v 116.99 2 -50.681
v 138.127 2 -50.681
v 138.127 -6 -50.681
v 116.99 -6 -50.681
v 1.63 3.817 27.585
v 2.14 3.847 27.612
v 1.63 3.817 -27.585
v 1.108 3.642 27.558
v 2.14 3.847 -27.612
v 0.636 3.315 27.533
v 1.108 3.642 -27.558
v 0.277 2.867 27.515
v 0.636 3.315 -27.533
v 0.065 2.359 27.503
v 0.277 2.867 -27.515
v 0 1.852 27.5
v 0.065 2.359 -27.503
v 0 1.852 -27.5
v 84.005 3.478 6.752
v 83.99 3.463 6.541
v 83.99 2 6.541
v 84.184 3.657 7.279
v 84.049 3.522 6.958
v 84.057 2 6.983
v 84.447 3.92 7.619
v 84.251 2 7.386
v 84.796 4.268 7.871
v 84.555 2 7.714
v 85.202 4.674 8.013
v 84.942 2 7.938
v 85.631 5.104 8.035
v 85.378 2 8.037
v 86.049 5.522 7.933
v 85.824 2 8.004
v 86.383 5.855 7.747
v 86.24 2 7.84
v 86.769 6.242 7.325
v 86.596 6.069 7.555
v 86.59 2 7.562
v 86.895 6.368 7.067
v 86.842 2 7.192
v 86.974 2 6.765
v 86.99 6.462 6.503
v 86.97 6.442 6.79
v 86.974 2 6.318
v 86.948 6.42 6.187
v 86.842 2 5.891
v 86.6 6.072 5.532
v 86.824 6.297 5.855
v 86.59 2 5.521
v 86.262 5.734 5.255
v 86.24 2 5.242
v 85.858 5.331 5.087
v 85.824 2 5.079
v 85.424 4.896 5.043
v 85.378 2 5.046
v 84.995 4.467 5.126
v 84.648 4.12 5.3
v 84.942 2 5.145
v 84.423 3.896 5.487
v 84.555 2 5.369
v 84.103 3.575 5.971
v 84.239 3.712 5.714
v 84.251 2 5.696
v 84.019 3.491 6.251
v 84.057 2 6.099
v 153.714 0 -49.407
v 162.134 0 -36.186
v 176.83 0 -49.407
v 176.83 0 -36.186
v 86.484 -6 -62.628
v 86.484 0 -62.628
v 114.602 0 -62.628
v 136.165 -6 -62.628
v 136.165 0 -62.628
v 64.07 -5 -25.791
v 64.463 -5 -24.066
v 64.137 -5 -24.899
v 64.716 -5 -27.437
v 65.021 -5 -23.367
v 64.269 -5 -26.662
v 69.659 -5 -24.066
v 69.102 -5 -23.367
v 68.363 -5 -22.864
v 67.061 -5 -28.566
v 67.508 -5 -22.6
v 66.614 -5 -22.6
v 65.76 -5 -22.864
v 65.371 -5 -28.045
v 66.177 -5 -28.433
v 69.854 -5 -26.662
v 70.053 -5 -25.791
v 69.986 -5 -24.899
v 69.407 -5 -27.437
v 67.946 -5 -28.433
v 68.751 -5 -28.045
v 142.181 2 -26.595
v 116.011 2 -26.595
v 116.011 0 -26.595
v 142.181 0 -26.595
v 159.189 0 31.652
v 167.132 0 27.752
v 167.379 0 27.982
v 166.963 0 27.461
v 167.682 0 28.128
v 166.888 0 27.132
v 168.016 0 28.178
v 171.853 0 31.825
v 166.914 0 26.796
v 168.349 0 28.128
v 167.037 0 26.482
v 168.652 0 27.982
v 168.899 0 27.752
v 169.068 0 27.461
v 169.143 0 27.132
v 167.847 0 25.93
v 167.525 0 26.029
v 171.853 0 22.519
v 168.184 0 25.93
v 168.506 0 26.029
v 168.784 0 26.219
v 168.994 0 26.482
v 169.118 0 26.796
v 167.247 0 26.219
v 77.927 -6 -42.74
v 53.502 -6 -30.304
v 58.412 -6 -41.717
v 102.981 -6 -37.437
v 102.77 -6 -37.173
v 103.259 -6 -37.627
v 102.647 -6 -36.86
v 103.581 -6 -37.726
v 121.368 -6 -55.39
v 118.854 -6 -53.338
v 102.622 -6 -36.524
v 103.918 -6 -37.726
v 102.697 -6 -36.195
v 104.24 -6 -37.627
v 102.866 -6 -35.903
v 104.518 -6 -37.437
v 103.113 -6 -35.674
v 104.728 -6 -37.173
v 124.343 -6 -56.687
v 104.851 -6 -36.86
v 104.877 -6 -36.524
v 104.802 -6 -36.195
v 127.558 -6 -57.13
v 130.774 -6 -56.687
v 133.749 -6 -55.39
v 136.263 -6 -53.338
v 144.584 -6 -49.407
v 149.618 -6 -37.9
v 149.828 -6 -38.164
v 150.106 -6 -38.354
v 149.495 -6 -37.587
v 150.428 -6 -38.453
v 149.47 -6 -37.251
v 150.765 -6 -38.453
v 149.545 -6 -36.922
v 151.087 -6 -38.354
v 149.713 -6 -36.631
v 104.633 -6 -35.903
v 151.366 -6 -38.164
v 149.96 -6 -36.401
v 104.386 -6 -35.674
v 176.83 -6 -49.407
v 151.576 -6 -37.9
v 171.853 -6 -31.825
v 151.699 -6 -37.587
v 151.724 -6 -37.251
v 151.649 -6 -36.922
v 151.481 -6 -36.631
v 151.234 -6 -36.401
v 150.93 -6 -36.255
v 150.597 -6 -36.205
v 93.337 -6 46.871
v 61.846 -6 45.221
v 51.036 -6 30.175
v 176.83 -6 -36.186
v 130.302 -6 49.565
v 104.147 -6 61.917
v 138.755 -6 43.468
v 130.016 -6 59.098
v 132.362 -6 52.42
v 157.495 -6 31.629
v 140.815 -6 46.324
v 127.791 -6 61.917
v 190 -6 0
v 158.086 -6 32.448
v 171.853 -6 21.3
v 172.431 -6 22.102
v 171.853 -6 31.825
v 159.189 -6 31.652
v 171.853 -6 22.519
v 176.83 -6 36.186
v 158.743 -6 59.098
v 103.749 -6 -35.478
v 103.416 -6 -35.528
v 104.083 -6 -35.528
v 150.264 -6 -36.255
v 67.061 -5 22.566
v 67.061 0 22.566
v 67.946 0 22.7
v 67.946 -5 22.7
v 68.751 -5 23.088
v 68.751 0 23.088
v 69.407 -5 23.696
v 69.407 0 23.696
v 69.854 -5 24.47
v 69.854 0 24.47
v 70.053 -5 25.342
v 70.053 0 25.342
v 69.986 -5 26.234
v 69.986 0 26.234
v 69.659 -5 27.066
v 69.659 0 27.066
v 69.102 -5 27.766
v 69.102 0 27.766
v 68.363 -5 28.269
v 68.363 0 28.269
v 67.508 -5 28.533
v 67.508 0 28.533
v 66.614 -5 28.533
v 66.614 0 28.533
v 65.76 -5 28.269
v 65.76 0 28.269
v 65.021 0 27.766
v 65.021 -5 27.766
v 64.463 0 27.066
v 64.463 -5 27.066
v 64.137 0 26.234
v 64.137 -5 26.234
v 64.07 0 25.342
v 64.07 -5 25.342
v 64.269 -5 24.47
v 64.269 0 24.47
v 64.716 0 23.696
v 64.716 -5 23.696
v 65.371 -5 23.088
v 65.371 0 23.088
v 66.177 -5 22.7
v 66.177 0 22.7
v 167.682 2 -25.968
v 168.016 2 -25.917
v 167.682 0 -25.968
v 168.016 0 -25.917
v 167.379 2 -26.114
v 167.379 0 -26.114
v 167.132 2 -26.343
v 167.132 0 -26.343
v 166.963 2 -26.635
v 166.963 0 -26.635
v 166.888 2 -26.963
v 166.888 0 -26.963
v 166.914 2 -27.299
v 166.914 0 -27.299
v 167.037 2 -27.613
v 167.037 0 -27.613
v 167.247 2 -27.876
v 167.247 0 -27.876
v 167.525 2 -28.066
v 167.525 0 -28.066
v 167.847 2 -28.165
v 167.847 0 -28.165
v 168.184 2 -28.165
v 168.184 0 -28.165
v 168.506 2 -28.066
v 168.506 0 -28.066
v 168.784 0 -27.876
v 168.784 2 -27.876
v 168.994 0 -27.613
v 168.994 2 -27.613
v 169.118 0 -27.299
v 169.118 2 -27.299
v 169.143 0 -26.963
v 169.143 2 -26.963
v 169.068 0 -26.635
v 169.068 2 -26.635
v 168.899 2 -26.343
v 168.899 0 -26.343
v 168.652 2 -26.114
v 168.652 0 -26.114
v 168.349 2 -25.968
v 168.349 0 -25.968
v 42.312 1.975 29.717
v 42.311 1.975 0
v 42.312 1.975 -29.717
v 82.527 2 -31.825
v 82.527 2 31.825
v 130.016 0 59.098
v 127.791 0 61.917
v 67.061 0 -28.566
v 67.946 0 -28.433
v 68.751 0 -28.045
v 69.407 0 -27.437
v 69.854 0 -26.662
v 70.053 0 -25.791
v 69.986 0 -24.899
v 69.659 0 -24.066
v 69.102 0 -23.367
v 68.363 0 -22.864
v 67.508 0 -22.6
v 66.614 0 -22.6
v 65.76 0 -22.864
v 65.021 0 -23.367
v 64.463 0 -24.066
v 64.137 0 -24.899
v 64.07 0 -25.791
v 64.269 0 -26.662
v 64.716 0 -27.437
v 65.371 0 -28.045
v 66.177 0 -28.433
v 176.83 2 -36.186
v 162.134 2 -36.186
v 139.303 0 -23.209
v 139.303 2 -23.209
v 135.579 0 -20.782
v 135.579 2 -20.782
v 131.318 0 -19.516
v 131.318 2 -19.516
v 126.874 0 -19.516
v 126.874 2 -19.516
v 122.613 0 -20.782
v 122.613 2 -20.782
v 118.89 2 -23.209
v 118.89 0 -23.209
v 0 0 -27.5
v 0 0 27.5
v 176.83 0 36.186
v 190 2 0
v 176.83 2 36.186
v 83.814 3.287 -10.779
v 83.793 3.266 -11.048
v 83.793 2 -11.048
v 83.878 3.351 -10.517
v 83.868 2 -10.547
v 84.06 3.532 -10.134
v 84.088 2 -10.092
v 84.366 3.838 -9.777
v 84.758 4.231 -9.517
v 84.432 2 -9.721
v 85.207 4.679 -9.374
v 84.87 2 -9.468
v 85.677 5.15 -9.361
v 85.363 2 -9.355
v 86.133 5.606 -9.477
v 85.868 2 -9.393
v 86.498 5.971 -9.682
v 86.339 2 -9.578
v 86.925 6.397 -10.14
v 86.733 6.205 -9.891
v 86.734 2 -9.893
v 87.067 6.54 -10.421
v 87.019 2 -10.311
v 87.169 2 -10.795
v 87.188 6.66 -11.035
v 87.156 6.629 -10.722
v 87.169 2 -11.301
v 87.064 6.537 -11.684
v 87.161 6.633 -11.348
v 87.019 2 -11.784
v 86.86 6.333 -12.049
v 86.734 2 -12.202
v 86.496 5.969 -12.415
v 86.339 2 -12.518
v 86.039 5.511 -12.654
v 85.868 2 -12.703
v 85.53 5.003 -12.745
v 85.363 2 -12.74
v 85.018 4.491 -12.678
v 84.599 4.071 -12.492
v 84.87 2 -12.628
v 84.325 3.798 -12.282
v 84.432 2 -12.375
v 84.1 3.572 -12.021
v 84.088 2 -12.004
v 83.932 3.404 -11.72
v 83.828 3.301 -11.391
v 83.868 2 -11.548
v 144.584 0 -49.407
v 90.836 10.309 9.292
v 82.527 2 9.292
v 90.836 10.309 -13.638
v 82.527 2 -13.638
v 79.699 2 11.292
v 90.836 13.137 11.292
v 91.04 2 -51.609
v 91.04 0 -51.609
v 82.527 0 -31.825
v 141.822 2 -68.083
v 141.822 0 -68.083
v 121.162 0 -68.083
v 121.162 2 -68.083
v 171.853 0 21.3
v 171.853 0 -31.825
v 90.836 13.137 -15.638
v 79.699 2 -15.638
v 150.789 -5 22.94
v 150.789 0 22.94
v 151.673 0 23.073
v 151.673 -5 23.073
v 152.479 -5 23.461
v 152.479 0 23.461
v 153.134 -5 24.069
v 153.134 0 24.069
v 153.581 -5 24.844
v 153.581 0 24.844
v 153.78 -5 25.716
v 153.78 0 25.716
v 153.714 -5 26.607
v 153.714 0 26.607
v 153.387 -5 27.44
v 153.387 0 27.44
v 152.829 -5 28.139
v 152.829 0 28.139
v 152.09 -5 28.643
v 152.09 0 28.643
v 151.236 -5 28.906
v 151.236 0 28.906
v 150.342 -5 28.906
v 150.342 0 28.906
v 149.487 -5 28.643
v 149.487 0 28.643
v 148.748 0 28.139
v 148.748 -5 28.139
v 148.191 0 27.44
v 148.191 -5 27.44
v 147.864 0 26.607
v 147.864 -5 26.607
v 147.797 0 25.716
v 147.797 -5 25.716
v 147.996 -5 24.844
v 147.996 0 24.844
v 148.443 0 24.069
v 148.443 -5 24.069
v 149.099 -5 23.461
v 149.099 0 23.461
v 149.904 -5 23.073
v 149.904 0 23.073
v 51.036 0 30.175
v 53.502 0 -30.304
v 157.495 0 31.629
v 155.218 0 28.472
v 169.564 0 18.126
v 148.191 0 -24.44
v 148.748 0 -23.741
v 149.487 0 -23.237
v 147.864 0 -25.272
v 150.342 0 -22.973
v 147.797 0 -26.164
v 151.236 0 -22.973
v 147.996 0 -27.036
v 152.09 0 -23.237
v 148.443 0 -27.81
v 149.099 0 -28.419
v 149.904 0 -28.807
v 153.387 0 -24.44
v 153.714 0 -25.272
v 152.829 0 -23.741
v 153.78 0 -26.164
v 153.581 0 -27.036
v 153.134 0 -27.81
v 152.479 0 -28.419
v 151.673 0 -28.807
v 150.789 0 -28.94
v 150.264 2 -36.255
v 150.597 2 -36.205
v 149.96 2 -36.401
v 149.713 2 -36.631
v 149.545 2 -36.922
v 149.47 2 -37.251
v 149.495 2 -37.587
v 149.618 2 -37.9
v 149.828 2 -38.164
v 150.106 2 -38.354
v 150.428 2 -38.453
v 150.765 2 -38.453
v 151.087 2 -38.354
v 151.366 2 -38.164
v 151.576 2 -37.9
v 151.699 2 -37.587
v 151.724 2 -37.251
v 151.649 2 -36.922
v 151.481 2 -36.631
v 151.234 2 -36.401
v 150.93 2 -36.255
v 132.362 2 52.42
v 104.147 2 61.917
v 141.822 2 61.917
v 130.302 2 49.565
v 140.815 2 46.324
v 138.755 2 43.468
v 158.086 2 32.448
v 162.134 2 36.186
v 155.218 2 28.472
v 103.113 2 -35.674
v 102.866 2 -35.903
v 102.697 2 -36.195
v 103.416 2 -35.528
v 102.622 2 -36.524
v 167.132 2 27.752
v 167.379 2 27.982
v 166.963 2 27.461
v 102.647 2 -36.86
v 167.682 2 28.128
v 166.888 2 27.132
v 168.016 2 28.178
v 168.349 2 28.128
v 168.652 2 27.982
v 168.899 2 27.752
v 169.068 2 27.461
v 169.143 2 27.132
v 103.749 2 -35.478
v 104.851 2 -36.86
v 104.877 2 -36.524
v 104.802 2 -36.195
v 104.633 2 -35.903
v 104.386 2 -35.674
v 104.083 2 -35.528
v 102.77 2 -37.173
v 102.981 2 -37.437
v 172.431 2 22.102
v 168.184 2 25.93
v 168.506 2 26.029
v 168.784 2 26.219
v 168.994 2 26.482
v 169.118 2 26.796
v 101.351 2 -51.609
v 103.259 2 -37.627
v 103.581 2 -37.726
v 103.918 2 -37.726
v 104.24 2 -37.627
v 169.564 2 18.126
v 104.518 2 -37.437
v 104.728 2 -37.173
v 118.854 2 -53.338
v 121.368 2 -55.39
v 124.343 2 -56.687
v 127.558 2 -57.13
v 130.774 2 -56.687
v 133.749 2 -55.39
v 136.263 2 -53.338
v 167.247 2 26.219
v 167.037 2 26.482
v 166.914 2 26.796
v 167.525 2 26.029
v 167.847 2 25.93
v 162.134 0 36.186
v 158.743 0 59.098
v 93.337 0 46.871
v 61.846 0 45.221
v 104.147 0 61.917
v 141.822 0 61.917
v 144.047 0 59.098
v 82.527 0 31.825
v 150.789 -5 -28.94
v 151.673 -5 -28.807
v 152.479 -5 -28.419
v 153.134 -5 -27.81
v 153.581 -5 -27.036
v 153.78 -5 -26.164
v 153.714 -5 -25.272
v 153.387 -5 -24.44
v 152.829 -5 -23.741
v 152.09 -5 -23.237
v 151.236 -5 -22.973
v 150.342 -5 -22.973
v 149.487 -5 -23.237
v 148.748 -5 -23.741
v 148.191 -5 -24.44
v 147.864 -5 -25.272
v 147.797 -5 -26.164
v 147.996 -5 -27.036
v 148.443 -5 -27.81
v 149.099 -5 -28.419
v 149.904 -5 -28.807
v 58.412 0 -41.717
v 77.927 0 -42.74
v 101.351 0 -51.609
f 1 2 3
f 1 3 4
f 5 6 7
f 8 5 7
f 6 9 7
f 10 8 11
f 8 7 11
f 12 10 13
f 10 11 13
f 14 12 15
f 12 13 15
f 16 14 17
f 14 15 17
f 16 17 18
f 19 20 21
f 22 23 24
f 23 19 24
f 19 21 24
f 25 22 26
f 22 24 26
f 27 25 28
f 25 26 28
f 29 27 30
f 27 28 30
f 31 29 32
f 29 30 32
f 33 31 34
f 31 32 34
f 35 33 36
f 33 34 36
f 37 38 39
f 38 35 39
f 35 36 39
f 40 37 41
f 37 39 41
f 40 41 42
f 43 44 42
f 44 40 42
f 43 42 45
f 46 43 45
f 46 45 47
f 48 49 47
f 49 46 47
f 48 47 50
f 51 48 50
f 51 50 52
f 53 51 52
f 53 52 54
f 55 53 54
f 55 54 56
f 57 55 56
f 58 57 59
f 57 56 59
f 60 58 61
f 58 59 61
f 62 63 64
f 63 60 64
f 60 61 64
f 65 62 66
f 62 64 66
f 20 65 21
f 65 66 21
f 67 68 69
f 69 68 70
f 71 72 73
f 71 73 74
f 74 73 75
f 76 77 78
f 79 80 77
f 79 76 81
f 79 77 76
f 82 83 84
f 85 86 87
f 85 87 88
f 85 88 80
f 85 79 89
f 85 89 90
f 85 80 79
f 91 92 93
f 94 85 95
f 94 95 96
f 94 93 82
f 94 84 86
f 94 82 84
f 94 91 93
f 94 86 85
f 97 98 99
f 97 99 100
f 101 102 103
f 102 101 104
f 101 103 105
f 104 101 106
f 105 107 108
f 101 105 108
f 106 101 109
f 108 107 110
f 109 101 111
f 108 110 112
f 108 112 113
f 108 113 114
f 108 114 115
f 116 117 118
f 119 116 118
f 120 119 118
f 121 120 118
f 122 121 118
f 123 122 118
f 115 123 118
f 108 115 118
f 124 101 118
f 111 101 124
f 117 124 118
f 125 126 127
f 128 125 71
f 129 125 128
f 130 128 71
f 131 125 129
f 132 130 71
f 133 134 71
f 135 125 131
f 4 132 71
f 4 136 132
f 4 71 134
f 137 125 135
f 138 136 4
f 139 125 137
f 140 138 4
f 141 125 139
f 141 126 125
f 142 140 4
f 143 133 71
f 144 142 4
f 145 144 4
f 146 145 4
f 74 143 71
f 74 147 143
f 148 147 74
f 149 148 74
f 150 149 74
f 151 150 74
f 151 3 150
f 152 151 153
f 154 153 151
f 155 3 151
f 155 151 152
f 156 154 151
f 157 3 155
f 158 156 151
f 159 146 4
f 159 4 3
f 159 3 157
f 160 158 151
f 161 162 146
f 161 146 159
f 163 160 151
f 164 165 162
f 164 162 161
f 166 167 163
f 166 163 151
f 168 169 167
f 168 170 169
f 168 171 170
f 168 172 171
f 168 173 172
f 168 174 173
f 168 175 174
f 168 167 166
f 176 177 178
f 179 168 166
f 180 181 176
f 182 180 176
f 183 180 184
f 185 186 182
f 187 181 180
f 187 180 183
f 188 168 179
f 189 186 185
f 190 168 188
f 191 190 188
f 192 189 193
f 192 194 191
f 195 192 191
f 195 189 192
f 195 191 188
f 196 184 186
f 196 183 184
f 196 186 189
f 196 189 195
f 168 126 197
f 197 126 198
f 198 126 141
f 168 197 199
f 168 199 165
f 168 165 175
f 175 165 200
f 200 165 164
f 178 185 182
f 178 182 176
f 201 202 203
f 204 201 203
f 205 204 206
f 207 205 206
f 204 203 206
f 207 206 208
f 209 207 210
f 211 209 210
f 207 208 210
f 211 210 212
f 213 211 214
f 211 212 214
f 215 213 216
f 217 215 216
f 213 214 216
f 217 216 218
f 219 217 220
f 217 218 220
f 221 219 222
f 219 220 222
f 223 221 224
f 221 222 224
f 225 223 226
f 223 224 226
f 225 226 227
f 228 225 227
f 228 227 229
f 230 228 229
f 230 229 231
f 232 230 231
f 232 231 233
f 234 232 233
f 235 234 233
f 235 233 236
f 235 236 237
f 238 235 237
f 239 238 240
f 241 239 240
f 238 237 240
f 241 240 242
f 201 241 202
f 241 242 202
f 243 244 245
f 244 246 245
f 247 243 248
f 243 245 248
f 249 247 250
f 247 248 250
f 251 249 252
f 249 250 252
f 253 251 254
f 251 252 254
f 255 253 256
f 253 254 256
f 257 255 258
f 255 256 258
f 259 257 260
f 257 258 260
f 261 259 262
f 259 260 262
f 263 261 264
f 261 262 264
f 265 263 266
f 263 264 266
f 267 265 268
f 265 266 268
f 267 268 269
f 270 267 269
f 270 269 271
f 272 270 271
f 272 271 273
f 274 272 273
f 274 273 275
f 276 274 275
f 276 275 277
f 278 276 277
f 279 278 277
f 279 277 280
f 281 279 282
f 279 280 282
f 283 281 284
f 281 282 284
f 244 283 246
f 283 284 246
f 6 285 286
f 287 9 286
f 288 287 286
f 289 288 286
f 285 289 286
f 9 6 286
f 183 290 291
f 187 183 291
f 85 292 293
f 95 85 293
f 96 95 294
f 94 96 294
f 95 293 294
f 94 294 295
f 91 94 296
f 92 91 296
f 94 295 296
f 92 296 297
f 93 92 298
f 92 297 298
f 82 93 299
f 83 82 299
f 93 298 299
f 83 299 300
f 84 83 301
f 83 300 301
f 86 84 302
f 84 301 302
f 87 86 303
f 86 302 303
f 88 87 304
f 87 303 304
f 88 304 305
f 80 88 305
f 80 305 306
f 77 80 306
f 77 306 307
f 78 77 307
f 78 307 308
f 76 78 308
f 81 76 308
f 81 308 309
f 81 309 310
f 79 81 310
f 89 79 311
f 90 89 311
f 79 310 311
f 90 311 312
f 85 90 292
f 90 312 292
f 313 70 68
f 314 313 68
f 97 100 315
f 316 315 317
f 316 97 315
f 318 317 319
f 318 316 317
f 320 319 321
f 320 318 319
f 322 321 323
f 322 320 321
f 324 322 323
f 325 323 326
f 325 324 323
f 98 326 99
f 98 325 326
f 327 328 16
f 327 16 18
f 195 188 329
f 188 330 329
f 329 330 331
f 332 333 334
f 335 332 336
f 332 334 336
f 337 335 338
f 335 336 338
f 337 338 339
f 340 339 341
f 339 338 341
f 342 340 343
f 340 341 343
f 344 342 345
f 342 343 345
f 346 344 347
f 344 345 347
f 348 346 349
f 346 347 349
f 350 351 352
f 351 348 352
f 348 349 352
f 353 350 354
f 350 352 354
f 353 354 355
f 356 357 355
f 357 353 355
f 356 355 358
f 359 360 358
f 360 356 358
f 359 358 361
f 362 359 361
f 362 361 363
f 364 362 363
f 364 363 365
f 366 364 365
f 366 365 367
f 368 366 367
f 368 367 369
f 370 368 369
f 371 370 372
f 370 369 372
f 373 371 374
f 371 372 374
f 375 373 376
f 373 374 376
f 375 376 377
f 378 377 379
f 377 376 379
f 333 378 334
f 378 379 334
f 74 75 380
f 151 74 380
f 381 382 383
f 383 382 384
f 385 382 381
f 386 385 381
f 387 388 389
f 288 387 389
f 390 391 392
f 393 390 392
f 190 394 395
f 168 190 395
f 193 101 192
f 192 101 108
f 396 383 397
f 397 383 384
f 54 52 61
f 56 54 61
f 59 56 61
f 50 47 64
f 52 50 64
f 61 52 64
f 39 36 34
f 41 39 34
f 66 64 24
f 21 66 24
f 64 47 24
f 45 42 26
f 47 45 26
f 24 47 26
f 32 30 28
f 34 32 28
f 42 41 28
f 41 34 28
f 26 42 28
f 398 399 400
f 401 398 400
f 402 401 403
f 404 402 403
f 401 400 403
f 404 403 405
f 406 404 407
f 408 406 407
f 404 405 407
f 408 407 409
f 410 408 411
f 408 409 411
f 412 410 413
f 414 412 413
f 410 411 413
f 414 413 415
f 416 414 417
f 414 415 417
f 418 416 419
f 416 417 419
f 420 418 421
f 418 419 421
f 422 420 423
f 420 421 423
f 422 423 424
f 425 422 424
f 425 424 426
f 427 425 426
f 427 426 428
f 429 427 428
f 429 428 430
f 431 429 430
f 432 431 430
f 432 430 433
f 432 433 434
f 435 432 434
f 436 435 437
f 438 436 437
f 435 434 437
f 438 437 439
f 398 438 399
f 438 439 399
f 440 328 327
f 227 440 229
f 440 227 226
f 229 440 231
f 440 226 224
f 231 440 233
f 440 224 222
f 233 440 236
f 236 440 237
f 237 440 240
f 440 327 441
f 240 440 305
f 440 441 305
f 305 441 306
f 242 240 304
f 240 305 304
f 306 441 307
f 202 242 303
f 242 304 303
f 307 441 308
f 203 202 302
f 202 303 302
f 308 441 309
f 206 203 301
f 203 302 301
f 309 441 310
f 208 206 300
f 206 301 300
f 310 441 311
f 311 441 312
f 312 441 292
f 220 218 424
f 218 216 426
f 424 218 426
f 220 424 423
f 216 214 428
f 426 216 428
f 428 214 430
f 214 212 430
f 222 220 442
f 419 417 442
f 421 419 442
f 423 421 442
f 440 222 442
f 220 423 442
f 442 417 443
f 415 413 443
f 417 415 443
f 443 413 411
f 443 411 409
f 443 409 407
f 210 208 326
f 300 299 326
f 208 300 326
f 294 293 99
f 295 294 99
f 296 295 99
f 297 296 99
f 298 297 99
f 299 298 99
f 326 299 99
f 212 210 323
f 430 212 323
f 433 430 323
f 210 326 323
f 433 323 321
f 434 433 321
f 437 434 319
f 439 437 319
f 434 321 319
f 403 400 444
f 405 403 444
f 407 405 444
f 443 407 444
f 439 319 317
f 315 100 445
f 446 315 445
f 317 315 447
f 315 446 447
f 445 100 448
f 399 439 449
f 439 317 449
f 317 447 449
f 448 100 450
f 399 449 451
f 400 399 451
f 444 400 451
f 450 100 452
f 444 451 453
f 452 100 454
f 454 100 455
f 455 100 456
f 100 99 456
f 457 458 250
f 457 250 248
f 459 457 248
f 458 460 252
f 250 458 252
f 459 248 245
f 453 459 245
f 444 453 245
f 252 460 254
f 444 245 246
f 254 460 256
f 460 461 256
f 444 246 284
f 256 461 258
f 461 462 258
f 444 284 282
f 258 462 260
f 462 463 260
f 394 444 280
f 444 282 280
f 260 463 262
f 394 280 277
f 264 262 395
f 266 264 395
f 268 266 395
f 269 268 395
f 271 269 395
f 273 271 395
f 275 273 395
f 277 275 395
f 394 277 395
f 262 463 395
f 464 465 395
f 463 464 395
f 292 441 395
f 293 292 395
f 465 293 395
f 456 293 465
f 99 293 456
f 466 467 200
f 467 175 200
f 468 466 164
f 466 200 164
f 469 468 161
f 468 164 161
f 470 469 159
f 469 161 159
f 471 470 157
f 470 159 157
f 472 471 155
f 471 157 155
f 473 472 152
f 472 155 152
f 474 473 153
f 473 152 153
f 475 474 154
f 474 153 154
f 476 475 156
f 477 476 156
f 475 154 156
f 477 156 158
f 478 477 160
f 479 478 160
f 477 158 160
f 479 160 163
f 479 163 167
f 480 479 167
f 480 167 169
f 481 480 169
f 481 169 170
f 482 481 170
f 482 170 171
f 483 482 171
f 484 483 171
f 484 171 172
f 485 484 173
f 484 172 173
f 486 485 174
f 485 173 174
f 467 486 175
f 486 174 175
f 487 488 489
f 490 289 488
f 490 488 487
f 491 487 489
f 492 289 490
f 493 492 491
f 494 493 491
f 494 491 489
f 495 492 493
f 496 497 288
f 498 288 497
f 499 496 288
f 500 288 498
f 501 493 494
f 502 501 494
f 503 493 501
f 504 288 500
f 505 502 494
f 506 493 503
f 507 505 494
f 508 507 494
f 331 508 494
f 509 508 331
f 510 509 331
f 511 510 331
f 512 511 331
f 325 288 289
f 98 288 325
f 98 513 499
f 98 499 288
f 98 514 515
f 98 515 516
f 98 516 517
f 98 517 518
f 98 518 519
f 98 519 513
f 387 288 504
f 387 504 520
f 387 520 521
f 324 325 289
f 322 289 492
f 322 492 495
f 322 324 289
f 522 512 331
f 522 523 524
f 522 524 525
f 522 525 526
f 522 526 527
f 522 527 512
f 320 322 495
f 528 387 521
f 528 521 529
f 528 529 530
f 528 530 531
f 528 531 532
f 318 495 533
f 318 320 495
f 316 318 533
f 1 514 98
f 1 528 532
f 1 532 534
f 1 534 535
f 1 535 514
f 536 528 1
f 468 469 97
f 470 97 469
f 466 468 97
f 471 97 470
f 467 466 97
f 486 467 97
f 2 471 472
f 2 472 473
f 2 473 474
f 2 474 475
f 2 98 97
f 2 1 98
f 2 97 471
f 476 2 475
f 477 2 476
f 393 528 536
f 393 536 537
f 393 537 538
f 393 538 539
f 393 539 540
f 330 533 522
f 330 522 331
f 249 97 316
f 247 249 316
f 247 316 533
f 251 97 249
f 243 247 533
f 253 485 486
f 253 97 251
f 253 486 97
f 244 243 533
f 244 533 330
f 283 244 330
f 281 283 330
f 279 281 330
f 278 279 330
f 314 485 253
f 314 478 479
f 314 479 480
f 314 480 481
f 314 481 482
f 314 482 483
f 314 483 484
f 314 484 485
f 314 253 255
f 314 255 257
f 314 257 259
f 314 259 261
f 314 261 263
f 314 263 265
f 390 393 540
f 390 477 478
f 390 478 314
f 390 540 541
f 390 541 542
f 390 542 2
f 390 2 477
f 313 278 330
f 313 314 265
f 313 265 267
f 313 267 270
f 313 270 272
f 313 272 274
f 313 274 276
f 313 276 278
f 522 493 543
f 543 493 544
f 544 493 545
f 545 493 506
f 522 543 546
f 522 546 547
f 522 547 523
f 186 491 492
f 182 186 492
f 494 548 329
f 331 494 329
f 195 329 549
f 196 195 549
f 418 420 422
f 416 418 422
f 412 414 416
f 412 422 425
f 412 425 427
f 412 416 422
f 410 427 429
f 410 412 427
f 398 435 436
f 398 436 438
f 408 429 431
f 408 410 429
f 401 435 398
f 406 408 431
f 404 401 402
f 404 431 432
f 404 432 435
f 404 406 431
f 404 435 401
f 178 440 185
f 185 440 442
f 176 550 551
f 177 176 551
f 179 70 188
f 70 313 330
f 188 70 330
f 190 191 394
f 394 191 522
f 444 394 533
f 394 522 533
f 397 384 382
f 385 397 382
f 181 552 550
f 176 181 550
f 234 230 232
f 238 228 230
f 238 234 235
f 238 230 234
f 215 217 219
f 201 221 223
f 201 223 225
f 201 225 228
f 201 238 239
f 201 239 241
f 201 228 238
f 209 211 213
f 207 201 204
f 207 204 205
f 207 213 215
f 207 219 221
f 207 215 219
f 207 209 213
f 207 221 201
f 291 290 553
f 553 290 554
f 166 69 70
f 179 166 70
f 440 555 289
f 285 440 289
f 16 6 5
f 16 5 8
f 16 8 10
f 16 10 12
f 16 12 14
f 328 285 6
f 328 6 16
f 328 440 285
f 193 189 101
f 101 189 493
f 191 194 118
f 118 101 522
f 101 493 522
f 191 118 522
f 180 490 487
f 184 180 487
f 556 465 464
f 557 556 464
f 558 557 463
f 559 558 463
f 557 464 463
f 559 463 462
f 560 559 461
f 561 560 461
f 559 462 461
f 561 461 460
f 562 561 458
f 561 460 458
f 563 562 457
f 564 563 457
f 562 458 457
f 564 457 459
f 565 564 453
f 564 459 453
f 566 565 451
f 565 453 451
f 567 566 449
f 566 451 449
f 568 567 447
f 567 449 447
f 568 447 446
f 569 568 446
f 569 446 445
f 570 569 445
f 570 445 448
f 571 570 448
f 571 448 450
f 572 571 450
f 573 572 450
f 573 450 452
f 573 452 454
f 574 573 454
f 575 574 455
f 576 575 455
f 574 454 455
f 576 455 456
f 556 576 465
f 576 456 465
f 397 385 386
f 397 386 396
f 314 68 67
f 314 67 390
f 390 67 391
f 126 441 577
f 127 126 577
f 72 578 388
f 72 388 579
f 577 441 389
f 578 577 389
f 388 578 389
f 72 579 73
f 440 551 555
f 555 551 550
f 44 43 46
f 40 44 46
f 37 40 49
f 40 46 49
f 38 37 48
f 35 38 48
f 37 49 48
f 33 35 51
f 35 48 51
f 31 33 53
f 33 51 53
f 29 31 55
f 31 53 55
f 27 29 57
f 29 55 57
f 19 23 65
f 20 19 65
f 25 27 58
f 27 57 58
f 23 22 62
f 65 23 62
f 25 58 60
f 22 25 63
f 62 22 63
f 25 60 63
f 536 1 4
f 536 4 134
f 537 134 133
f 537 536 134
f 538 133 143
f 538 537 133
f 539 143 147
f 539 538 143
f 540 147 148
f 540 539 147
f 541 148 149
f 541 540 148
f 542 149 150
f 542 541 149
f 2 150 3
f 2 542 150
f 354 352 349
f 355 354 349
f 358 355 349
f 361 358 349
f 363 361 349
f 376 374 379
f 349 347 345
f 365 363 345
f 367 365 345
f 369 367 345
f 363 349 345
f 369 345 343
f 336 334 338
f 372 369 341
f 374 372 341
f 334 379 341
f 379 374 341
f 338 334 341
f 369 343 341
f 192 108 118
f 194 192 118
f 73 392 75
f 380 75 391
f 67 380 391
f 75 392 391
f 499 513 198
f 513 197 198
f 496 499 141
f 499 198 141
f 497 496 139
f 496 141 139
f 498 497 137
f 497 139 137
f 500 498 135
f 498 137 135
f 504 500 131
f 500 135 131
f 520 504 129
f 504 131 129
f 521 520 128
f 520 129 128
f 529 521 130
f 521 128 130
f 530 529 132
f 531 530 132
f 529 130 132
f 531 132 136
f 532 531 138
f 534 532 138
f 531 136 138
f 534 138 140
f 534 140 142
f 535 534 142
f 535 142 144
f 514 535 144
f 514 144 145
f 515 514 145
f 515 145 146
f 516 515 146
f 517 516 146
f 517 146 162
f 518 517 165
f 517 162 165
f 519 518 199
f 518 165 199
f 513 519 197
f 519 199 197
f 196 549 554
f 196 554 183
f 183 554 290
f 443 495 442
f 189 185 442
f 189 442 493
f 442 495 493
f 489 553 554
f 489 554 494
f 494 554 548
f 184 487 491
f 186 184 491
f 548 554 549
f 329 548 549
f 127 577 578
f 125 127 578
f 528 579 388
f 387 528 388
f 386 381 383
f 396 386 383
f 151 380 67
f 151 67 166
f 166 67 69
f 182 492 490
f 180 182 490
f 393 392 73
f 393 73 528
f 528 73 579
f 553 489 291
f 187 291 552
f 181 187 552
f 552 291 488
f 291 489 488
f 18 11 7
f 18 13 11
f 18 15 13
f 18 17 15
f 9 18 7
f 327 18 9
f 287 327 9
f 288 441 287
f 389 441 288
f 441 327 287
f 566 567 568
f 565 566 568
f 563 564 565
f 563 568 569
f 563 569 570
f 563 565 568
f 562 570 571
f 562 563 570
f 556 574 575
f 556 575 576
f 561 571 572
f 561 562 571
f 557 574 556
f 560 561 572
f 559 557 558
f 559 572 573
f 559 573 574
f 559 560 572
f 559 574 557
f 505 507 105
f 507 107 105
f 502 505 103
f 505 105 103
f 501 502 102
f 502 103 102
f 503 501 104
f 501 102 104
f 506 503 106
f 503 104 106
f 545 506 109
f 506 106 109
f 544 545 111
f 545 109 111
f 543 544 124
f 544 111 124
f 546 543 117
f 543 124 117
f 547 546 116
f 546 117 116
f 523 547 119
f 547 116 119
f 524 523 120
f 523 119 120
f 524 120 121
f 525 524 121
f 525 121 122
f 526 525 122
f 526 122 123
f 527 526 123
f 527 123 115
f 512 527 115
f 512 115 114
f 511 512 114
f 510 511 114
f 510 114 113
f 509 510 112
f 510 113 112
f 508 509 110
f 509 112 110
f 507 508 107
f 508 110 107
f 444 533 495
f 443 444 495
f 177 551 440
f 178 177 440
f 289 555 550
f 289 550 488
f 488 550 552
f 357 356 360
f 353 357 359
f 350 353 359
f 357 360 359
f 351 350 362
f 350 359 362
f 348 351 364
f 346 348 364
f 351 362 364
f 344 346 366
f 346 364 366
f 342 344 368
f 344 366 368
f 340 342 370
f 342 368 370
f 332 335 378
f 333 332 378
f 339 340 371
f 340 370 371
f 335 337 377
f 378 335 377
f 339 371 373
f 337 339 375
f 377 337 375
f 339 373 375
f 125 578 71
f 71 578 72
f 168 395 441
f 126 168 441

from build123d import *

# Parameters (mm, degrees)
EXTRUDE_1_DEPTH               = 2
EXTRUDE_2_DEPTH               = 2
CUT_EXTRUDE_3_DEPTH           = 202.869395429
CUT_EXTRUDE_3_DEPTH_BACK      = 202.869395429
FILLET_1_R                    = 2
EXTRUDE_4_DEPTH               = 6
CUT_EXTRUDE_7_DEPTH           = 202.98824919
EXTRUDE_5_DEPTH               = 2
EXTRUDE_5_DRAFT               = -45
EXTRUDE_11_REACH              = 204.137
SKETCH_24_R                   = 1.697293379
SKETCH_24_R_2                 = 1.5
CUT_EXTRUDE_8_DEPTH           = 203.13682253
SKETCH_26_W                   = 1.1303
SKETCH_26_H                   = 10
HOLE_WIZARD_4_40_3_AT_2_COUNT = 2
HOLE_WIZARD_4_40_3_AT_2_PITCH = 54.095245987
SKETCH_29_R                   = 3
EXTRUDE_14_DEPTH              = 5
SKETCH_32_W                   = 1.1303
SKETCH_32_H                   = 8
HOLE_WIZARD_4_40_4_AT_2_COUNT = 2
HOLE_WIZARD_4_40_4_AT_2_PITCH = 46.853089657


with BuildPart() as part:
    # 草图2 → 凸台-拉伸1 (new body)
    with BuildSketch(Plane(origin=(0, 0, 0), x_dir=(1, 0, 0), z_dir=(0, 1, 0))):
        Polygon((141.821582241, 68.082690978), (121.161879345, 68.082690978), (101.35099463, 51.608897425), (91.039832206, 51.608897425), (82.527346571, 31.825074964), (0, 27.5), (0, -27.5), (82.527346571, -31.825074964), (104.14664553, -61.917309022), (141.821582241, -61.917309022), (162.133732132, -36.18552755), (176.829545061, -36.18552755), (190, 0), (176.829545061, 36.18552755), (162.133732132, 36.18552755), align=None)
    extrude(amount=EXTRUDE_1_DEPTH)

    # 草图6 → 凸台-拉伸2 (add)
    with BuildSketch(Plane(origin=(0, 2, 0), x_dir=(1, 0, 0), z_dir=(0, 1, 0))):
        Polygon((82.527346571, 31.825074964), (82.527346571, -31.825074964), (0, -27.5), (0, 27.5), align=None)
    extrude(amount=EXTRUDE_2_DEPTH)

    # 草图7 → 切除-拉伸3 (cut, two sides: drawn at the far end of the back side and taken through both)
    with BuildSketch(Plane.XY.offset(-CUT_EXTRUDE_3_DEPTH_BACK)):
        with BuildLine():
            Line((82.527346571, 2), (82.527346571, 30.740821148))
            Line((82.527346571, 30.740821148), (0, 4))
            add(Edge.make_bspline(
                [(82.527346571, 2), (41.215261335, 1.001172546), (0, 4)],
                knots=[0, 0, 0, 1, 1, 1], degree=2))
        make_face()
    extrude(amount=CUT_EXTRUDE_3_DEPTH + CUT_EXTRUDE_3_DEPTH_BACK, mode=Mode.SUBTRACT)

    # 圆角1
    fillet_1_edges = [part.edges().sort_by_distance(p)[0] for p in [
        (0, 4, 13.75),
    ]]
    fillet(fillet_1_edges, radius=FILLET_1_R)

    # 草图13 → 凸台-拉伸4 (add)
    with BuildSketch(Plane.XZ):
        Polygon((53.501507434, -30.303895193), (58.412275987, -41.716986195), (77.926898746, -42.739704237), (86.484415452, -62.62818317), (136.164724768, -62.62818317), (144.584081331, -49.40685536), (176.829545061, -49.40685536), (176.829545061, -36.18552755), (190, 0), (176.829545061, 36.18552755), (158.743204348, 59.097615602), (130.016377906, 59.097615602), (127.790568727, 61.917309022), (104.14664553, 61.917309022), (93.336996051, 46.871191993), (61.845926158, 45.220814953), (51.036276678, 30.174697924), (171.852914921, 31.825074964), (171.852914921, -31.825074964), align=None)
    extrude(amount=EXTRUDE_4_DEPTH)

    # 草图18 → 切除-拉伸7 (cut, through all)
    with BuildSketch(Plane(origin=(0, 2, 0), x_dir=(1, 0, 0), z_dir=(0, 1, 0))):
        Polygon((169.563862496, -18.125868021), (155.218286362, -28.471875769), (158.085778721, -32.447885738), (172.431354854, -22.101877989), align=None)
        Polygon((130.302091903, -49.564637909), (132.361562224, -52.420260001), (140.814695434, -46.323873151), (138.755225113, -43.468251059), align=None)
    extrude(amount=-CUT_EXTRUDE_7_DEPTH, mode=Mode.SUBTRACT)

    # 草图17 → 切除-拉伸8 (cut, through all)
    with BuildSketch(Plane(origin=(0, 2, 0), x_dir=(1, 0, 0), z_dir=(0, 1, 0))):
        with BuildLine():
            Line((116.011181983, 26.59529287), (142.181150975, 26.59529287))
            ThreePointArc((142.181150975, 26.59529287), (129.096166479, 19.355270398), (116.011181983, 26.59529287))
        make_face()
        with BuildLine():
            Line((138.127410429, 50.681307574), (116.98958299, 50.681307574))
            ThreePointArc((116.98958299, 50.681307574), (127.55849671, 57.129732827), (138.127410429, 50.681307574))
        make_face()
    extrude(amount=-CUT_EXTRUDE_8_DEPTH, mode=Mode.SUBTRACT)

    # 草图26 → #4-40 螺纹孔3 (revolve, cut)
    with BuildSketch(Plane(origin=(168.015540482, 4, 27.047622993), x_dir=(0, 0, 1), z_dir=(1, 0, 0))):
        with Locations((0.56515, 5)):
            Rectangle(SKETCH_26_W, SKETCH_26_H)
    hole_wizard_4_40_3 = revolve(axis=Axis((168.015540482, 10.35, 27.047622993), (0, -1, 0)), mode=Mode.SUBTRACT)

    # #4-40 螺纹孔3 at 2: #4-40 螺纹孔3 ×2
    with Locations(*[(0, 0, -i * HOLE_WIZARD_4_40_3_AT_2_PITCH) for i in range(1, HOLE_WIZARD_4_40_3_AT_2_COUNT)]):
        add(hole_wizard_4_40_3, mode=Mode.SUBTRACT)

    # 草图29 → 凸台-拉伸14 (add)
    with BuildSketch(Plane.XZ):
        with Locations(Location((67.061317629, 25.566411224, 0), (0, 0, 270))):
            Circle(SKETCH_29_R)
        with Locations(Location((67.061317629, -25.566411224, 0), (0, 0, 270))):
            Circle(SKETCH_29_R)
        with Locations(Location((150.788762168, 25.939901438, 0), (0, 0, 270))):
            Circle(SKETCH_29_R)
        with Locations(Location((150.788762168, -25.939901438, 0), (0, 0, 270))):
            Circle(SKETCH_29_R)
    extrude(amount=EXTRUDE_14_DEPTH)

    # 草图32 → #4-40 螺纹孔4 (revolve, cut)
    with BuildSketch(Plane(origin=(150.596814185, 2, -37.335284881), x_dir=(0, 0, 1), z_dir=(1, 0, 0))):
        with Locations((0.56515, 4)):
            Rectangle(SKETCH_32_W, SKETCH_32_H)
    hole_wizard_4_40_4 = revolve(axis=Axis((150.596814185, 8.35, -37.335284881), (0, -1, 0)), mode=Mode.SUBTRACT)

    # #4-40 螺纹孔4 at 2: #4-40 螺纹孔4 ×2
    with Locations(*[Vector(-0.9998795871522861, 0, 0.015518092543031247) * (i * HOLE_WIZARD_4_40_4_AT_2_PITCH) for i in range(1, HOLE_WIZARD_4_40_4_AT_2_COUNT)]):
        add(hole_wizard_4_40_4, mode=Mode.SUBTRACT)


with BuildPart() as body_2:
    # 草图23 → 凸台-拉伸5 (with draft: the straight prism first)
    with BuildSketch(Plane(origin=(40.263673286, -40.263673286, 0), x_dir=(0, 0, -1), z_dir=(-0.7071067811865488, 0.7071067811865464, 0))):
        Polygon((-9.292036768, -59.769859956), (-9.292036768, -60.809778756), (-9.292036768, -71.520555916), (13.638077716, -71.520555916), (13.638077716, -59.769859956), align=None)
    extrude(amount=EXTRUDE_5_DEPTH)
    # 凸台-拉伸5: the draft: its side faces are tilted about the plane it starts from
    extrude_5_sides = [body_2.faces().sort_by_distance(p)[0] for p in [
        (85.974738189, 6.86160518, 9.292036768),
        (85.974738189, 6.86160518, -13.638077716),
        (90.129236587, 11.016103578, -2.173020474),
        (81.82023979, 2.707106781, -2.173020474),
    ]]
    draft(extrude_5_sides, Plane(origin=(40.263673286, -40.263673286, 0), x_dir=(0, 0, -1), z_dir=(-0.7071067811865488, 0.7071067811865464, 0)), EXTRUDE_5_DRAFT)


with BuildPart() as body_3:
    # 凸台-拉伸11: up to this plane
    extrude_11_end = Plane(origin=(40.263673286, -40.263673286, 0), z_dir=(0.7071067811865476, -0.7071067811865476, 0))
    # 草图24 → 凸台-拉伸11 (new, up to the surface)
    with BuildSketch(Plane(origin=(0, 2, 0), x_dir=(1, 0, 0), z_dir=(0, 1, 0)), mode=Mode.PRIVATE) as extrude_11_sk1:
        with Locations(Location((85.490261725, 11.047785882, 0), (0, 0, 180))):
            Circle(SKETCH_24_R)
    extrude_11_tool1 = split(extrude(extrude_11_sk1.sketch, amount=EXTRUDE_11_REACH, mode=Mode.PRIVATE), bisect_by=extrude_11_end, keep=Keep.BOTH, mode=Mode.PRIVATE)
    add(extrude_11_tool1.solids().sort_by_distance((85.490262, 2, -11.047786))[0])
    # 草图24 → 凸台-拉伸11 (new, up to the surface)
    with BuildSketch(Plane(origin=(0, 2, 0), x_dir=(1, 0, 0), z_dir=(0, 1, 0)), mode=Mode.PRIVATE) as extrude_11_sk2:
        with Locations(Location((85.490261725, -6.54134788, 0), (0, 0, 180))):
            Circle(SKETCH_24_R_2)
    extrude_11_tool2 = split(extrude(extrude_11_sk2.sketch, amount=EXTRUDE_11_REACH, mode=Mode.PRIVATE), bisect_by=extrude_11_end, keep=Keep.BOTH, mode=Mode.PRIVATE)
    add(extrude_11_tool2.solids().sort_by_distance((85.490262, 2, 6.541348))[0])


solid = Compound([part.part, body_2.part, body_3.part])
